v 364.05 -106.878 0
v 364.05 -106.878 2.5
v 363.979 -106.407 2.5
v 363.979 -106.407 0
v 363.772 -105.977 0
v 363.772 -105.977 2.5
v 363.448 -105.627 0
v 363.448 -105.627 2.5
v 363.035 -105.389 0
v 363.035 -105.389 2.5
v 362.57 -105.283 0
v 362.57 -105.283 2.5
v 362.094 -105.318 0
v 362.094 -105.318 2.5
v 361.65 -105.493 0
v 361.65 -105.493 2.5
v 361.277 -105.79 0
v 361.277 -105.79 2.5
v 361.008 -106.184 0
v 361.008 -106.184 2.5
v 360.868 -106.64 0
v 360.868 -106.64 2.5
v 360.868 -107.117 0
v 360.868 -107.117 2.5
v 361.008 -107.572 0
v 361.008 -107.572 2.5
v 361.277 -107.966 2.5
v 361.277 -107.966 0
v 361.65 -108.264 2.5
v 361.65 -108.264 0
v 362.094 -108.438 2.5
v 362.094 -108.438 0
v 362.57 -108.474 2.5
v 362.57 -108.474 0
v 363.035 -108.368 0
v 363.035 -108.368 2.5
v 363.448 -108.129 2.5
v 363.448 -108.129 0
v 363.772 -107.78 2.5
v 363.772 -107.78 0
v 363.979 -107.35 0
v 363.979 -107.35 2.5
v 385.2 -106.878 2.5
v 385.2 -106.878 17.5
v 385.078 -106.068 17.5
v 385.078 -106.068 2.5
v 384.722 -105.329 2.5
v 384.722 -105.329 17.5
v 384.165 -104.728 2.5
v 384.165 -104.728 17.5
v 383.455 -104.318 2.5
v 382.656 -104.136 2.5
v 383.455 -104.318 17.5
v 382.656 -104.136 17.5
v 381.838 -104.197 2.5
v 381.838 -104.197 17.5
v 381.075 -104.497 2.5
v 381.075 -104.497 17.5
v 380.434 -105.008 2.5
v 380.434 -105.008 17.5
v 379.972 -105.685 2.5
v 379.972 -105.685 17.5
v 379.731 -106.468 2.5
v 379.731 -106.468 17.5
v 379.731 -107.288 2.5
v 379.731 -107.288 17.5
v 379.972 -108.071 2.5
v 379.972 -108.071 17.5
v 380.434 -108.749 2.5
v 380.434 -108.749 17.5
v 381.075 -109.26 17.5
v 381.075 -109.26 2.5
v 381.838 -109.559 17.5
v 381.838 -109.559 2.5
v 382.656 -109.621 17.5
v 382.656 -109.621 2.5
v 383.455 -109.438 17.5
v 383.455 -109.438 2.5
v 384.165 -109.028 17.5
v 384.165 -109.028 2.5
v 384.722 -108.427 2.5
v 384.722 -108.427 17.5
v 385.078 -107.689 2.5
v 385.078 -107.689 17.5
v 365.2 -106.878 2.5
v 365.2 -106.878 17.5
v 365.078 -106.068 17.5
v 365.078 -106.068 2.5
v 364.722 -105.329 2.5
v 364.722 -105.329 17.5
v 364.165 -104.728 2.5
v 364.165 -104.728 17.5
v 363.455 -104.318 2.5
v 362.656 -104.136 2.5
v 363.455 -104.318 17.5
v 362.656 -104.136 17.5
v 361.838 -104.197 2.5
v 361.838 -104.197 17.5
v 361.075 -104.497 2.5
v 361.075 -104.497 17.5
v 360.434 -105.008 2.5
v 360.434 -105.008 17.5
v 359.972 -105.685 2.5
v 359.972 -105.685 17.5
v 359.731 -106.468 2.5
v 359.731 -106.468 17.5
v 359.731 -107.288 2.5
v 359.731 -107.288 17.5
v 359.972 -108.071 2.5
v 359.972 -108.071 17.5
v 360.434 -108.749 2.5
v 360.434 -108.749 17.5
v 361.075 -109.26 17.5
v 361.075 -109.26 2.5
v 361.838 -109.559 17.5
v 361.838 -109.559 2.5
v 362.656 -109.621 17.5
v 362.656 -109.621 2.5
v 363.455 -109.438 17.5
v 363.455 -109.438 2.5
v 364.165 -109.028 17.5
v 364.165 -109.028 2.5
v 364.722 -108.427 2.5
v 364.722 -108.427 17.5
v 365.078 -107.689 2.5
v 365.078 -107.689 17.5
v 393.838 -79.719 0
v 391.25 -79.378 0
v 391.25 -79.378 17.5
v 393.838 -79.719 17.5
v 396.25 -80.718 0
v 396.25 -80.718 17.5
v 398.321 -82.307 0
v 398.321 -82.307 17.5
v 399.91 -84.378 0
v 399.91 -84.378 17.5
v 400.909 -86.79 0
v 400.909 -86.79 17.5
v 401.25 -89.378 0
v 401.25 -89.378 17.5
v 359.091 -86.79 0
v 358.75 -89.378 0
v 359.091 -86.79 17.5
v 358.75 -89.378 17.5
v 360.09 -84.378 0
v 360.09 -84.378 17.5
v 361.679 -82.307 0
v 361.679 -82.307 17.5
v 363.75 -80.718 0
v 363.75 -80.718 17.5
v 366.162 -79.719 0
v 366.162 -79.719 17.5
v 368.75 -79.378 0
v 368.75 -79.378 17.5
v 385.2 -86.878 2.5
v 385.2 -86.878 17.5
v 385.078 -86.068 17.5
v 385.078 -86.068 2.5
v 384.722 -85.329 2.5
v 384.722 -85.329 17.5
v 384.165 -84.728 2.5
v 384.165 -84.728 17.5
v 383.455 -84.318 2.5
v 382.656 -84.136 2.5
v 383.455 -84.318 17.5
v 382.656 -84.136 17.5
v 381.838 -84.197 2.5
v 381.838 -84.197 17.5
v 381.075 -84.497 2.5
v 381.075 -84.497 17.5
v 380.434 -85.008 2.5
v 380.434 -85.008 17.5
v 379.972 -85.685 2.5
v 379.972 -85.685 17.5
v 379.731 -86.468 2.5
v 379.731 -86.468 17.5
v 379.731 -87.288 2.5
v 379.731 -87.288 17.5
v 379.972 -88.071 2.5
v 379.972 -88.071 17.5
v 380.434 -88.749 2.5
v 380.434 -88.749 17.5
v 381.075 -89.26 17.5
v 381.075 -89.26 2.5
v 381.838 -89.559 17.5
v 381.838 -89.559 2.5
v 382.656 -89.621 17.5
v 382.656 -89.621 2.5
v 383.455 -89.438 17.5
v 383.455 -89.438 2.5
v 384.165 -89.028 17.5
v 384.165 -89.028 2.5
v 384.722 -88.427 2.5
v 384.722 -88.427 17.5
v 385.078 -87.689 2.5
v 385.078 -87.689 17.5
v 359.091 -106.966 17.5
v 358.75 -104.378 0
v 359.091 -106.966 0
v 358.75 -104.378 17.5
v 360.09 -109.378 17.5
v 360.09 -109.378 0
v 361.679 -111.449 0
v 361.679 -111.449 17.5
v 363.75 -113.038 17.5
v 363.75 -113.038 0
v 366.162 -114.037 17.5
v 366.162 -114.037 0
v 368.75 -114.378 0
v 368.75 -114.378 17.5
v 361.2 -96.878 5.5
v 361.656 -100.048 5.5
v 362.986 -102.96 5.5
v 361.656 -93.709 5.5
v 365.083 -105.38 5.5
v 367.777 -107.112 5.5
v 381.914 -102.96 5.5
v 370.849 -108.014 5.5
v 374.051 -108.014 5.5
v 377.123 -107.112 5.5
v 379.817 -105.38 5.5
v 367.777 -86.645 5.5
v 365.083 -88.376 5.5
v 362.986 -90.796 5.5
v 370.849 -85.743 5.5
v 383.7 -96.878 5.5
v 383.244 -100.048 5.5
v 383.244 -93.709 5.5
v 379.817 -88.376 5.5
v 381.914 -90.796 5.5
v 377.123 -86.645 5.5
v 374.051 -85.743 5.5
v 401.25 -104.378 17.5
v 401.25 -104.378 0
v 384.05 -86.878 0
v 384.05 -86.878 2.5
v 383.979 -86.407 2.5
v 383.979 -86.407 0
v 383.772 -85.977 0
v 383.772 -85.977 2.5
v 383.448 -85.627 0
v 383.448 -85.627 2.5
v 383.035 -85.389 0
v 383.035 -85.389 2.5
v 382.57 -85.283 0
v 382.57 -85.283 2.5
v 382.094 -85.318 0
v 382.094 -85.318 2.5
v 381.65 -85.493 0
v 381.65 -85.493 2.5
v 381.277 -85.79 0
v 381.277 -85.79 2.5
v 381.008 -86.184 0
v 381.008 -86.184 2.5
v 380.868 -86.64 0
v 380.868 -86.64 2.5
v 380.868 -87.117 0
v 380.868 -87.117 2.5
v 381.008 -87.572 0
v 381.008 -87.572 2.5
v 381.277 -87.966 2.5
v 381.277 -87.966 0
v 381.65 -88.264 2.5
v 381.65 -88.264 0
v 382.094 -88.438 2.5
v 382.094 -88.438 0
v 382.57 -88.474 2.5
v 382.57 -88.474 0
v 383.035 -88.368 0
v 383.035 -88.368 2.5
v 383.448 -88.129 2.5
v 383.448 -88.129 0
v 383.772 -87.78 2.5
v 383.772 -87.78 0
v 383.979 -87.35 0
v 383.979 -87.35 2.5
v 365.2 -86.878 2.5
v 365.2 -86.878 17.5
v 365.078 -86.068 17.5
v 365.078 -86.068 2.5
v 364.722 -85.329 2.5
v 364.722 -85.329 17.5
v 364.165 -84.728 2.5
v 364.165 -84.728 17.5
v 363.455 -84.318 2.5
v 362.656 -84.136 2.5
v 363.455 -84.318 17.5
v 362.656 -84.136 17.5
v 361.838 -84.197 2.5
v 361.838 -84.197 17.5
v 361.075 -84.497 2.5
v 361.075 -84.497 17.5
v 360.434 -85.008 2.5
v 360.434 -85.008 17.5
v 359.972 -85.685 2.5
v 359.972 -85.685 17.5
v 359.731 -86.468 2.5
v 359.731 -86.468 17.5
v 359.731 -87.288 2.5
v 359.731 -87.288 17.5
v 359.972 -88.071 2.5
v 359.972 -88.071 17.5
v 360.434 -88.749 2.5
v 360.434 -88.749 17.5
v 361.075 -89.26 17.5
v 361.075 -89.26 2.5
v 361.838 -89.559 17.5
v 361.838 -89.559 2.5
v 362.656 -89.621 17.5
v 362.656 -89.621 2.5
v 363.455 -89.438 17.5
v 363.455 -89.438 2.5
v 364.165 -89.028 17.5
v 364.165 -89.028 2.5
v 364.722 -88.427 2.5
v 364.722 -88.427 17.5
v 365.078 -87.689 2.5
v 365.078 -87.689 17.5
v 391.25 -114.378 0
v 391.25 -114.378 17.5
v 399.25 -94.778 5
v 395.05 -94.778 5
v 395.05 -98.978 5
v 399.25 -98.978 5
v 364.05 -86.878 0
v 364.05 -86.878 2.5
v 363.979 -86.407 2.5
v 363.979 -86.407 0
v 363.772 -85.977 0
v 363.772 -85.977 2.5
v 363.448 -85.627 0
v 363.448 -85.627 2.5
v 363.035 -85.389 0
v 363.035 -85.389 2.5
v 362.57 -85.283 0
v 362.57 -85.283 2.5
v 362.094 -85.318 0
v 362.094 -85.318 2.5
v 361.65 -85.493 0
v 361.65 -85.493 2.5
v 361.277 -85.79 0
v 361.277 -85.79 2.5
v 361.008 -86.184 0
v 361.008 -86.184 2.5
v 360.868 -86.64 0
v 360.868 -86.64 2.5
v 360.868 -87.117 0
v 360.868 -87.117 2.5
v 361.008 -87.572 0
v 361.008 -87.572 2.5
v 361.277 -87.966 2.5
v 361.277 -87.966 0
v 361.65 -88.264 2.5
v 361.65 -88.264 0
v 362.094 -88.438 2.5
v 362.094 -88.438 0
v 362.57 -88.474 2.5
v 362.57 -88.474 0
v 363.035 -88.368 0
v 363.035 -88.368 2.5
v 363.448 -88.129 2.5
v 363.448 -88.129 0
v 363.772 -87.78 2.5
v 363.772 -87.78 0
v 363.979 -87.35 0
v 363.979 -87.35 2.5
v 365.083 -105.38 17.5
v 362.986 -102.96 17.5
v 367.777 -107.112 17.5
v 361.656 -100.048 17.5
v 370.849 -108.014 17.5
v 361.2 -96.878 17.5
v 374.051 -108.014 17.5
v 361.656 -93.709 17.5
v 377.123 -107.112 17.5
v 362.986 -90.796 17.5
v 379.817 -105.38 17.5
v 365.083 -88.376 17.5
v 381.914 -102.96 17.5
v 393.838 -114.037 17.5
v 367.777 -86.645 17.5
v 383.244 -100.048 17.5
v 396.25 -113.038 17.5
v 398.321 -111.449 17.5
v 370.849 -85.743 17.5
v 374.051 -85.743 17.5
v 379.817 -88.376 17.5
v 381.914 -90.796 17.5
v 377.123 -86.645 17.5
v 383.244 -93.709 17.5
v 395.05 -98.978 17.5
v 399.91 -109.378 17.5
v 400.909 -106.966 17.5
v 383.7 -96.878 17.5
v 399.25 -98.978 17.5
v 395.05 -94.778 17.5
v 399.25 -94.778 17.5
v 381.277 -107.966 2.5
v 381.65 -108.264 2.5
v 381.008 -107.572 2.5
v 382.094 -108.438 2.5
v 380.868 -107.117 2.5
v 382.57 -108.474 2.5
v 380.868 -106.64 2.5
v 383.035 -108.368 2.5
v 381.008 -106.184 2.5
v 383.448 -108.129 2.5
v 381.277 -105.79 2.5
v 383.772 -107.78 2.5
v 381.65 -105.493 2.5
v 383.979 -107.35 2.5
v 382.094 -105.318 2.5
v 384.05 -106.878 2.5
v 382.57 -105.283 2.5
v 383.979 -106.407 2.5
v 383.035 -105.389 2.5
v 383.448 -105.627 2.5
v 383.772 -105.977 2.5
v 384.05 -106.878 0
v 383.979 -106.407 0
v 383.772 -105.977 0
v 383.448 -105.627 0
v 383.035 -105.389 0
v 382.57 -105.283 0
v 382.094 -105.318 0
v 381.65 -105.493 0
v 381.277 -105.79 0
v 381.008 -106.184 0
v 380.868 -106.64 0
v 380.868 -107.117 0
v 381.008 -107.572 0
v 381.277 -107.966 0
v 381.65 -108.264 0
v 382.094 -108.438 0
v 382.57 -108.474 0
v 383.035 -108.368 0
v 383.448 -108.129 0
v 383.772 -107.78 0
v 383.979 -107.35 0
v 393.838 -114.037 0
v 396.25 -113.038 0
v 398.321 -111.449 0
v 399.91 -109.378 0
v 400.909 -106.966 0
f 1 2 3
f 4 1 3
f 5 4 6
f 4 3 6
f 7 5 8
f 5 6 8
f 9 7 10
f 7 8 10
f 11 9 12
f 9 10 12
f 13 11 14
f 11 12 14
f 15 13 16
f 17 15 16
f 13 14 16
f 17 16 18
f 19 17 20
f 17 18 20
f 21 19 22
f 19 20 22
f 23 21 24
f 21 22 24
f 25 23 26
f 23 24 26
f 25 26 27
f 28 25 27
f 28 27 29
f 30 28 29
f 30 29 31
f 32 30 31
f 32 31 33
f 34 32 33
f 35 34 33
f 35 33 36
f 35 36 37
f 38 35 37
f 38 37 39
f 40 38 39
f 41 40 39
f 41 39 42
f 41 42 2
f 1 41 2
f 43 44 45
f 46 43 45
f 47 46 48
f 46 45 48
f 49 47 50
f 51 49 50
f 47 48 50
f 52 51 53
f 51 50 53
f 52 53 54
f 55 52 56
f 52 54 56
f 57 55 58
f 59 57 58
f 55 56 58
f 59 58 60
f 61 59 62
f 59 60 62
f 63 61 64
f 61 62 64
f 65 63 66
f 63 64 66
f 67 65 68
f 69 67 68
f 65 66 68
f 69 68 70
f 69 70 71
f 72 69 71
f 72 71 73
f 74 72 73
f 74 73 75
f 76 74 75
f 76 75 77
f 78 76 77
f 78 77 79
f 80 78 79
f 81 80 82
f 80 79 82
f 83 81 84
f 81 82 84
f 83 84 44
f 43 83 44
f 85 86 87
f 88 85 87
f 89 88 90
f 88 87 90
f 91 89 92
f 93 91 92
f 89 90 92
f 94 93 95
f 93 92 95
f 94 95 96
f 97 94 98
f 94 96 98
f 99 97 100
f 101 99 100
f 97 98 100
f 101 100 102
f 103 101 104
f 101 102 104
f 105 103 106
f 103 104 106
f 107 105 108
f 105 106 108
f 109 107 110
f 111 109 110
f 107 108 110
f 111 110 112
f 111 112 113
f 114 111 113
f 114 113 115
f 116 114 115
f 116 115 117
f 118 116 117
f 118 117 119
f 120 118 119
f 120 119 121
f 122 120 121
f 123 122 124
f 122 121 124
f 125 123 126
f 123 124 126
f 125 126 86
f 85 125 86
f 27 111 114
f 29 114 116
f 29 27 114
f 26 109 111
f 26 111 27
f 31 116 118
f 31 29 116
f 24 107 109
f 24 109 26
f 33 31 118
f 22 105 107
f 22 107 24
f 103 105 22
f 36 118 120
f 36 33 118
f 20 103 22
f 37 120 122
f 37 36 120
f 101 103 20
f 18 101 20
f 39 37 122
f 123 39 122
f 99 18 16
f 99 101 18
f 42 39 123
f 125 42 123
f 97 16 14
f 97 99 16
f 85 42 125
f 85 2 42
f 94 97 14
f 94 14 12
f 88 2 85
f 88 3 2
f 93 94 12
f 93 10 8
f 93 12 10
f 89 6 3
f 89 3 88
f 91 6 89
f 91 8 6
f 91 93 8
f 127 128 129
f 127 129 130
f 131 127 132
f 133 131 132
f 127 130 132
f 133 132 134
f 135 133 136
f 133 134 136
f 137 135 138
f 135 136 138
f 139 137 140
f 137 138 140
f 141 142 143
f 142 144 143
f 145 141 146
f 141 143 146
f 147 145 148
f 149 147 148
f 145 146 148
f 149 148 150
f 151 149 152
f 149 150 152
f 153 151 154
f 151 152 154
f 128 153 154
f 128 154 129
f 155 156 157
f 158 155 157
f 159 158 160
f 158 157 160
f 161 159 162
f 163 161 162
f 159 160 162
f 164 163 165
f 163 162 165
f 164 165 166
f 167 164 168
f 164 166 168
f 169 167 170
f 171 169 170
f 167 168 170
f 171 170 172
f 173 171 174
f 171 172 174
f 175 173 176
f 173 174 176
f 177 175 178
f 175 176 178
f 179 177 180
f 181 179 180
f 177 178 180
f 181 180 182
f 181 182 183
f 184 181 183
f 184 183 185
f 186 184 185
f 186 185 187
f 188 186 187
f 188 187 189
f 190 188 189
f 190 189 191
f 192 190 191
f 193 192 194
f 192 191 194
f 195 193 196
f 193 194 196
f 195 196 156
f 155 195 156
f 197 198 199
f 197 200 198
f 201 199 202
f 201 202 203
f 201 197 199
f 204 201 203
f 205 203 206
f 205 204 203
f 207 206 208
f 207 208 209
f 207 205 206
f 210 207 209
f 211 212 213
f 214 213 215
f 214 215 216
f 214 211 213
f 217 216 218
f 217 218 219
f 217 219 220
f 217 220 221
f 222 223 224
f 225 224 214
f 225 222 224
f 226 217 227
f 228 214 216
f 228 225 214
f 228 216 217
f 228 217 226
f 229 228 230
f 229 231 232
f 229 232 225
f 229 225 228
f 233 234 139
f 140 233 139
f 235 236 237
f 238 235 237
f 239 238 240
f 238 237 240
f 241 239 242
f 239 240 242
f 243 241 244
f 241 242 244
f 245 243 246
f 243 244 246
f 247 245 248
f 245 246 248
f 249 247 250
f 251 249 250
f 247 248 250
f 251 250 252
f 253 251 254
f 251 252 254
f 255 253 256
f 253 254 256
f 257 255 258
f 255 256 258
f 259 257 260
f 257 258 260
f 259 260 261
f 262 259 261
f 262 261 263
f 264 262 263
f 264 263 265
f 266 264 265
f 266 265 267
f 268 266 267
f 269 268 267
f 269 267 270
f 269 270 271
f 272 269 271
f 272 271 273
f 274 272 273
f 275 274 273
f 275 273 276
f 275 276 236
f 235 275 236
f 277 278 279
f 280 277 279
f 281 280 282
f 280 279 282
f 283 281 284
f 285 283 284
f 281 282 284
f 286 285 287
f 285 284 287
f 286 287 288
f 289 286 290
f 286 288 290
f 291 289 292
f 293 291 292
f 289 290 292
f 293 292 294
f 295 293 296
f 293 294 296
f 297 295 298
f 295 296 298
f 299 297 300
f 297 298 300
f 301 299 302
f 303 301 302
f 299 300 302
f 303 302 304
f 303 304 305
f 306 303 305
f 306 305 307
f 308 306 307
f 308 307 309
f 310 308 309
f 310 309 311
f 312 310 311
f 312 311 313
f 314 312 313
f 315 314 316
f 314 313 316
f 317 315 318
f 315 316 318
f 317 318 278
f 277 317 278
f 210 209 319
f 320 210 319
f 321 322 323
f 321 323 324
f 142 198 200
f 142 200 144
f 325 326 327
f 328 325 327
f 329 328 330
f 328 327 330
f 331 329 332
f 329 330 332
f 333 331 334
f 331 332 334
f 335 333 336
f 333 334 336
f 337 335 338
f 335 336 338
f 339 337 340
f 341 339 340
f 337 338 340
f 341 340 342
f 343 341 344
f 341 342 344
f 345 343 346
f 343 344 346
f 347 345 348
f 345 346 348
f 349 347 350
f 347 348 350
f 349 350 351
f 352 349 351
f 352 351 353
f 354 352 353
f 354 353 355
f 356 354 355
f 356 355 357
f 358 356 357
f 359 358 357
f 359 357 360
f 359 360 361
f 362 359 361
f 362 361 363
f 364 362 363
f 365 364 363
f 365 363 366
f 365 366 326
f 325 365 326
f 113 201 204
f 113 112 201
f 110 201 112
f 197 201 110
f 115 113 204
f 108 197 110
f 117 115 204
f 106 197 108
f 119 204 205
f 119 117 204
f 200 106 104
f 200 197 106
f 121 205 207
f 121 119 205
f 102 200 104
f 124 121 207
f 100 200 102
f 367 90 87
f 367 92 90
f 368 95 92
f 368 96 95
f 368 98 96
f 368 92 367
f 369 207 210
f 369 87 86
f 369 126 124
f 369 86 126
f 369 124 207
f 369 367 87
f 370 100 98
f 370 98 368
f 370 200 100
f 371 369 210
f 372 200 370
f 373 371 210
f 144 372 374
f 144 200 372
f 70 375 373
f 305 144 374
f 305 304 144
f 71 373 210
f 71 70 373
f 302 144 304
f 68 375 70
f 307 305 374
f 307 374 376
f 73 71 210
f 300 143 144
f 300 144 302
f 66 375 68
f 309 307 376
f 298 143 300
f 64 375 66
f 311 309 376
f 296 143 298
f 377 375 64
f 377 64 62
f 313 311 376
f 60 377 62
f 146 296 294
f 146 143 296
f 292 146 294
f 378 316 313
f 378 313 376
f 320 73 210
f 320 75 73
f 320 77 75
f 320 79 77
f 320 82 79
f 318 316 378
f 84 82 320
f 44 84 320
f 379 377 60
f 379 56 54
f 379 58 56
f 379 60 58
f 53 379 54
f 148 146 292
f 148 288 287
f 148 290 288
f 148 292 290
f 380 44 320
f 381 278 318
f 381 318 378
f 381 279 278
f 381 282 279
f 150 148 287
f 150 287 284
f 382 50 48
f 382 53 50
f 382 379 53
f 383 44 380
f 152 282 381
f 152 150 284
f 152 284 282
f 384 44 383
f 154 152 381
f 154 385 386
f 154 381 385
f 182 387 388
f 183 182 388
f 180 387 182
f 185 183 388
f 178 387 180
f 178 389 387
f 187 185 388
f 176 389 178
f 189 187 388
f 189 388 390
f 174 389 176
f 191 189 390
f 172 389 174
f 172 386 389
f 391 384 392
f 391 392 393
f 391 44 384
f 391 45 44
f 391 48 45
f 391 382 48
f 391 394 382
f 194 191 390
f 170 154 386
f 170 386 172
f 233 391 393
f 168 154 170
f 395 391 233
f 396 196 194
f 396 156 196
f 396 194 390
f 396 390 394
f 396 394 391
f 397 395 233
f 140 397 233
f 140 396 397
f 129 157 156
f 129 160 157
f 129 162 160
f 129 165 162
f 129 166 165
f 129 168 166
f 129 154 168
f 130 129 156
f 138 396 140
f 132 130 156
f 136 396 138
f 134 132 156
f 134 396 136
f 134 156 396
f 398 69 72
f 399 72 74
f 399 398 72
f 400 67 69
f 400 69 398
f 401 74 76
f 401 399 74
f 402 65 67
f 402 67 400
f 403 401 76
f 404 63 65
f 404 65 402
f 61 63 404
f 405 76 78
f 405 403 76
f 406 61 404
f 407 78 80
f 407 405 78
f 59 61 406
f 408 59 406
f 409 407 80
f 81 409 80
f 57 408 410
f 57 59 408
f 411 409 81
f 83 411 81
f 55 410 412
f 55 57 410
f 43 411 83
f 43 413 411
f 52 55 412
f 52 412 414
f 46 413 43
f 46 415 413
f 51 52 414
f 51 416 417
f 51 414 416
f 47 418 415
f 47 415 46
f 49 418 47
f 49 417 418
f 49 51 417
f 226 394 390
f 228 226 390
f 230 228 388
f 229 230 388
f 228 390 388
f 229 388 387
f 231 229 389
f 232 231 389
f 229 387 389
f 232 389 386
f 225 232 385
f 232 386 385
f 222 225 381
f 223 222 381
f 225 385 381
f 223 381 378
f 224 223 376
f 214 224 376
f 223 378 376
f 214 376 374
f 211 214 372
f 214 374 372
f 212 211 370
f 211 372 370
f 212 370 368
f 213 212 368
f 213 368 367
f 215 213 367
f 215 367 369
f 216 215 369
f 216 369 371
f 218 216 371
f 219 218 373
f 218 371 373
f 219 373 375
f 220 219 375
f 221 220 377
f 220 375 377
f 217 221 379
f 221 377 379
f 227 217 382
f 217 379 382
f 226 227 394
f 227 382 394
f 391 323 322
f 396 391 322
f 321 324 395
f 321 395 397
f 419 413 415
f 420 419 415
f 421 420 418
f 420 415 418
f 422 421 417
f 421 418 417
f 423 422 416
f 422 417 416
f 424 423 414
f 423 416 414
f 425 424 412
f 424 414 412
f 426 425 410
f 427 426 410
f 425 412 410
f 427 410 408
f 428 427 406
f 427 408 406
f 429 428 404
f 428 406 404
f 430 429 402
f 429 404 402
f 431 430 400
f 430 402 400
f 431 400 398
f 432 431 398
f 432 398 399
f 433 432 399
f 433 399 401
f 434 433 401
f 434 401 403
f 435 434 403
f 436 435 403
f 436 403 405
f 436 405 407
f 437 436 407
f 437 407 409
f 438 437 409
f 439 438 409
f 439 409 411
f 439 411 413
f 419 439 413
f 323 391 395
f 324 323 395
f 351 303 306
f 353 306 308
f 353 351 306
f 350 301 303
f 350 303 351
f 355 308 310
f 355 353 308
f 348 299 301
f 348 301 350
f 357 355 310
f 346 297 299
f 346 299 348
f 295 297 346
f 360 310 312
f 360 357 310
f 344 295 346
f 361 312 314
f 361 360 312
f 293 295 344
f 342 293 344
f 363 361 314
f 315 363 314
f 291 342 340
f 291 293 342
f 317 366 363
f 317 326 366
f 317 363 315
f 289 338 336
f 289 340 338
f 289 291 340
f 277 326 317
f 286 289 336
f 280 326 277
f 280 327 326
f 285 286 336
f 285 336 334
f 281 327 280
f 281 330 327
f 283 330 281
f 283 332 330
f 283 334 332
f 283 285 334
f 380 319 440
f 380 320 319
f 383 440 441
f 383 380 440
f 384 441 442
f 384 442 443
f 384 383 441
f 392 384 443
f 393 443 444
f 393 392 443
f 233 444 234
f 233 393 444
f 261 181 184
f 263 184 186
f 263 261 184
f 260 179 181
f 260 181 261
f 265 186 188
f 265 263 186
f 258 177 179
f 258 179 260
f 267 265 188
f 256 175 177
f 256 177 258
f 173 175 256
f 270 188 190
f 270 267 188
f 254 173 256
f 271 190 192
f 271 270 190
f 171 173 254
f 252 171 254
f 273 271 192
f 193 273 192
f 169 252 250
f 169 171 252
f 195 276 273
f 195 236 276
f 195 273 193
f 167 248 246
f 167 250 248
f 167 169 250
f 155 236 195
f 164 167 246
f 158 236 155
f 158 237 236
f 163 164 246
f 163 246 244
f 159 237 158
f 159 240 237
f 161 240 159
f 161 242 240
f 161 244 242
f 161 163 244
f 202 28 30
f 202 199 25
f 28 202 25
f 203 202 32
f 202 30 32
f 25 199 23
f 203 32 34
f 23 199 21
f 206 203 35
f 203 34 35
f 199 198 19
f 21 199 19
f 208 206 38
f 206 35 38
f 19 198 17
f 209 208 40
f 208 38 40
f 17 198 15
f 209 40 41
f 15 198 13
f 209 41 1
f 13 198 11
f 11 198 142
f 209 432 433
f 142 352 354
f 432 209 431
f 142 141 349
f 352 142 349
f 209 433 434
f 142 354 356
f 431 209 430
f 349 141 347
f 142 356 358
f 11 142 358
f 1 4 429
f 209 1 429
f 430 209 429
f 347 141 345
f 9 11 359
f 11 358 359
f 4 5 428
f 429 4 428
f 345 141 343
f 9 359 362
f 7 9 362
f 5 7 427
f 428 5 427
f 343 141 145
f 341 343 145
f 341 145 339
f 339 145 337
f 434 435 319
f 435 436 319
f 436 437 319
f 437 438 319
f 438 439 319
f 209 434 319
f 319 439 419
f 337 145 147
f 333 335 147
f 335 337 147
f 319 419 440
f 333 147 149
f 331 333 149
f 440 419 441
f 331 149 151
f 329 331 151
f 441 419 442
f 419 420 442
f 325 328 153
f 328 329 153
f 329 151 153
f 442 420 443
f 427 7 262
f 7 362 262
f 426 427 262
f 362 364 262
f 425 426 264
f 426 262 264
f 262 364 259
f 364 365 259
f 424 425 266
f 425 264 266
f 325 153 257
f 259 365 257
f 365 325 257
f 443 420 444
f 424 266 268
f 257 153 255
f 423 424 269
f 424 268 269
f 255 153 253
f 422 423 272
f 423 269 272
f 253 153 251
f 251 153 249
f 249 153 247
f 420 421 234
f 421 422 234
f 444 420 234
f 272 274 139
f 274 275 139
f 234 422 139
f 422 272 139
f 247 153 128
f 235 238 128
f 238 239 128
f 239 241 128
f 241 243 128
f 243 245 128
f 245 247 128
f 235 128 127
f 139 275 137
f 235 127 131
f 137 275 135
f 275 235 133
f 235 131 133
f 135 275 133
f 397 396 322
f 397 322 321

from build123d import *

# Parameters (mm, degrees)
SKETCH1_W           = 42.5
SKETCH1_H           = 35
BOSS_EXTRUDE1_DEPTH = 17.5
SKETCH3_W           = 4.2
SKETCH3_H           = 4.2
CUT_EXTRUDE1_DEPTH  = 12.5
SKETCH4_R           = 1.599999998
SKETCH4_R_2         = 1.6
CUT_EXTRUDE2_DEPTH  = 18.5
SKETCH5_R           = 2.75
CUT_EXTRUDE3_DEPTH  = 15
SKETCH6_R           = 11.25
CUT_EXTRUDE4_DEPTH  = 12
FILLET1_R           = 10


with BuildPart() as part:
    # Sketch1 → Boss-Extrude1 (new body)
    with BuildSketch(Plane.XY):
        with Locations((380.000010525, -96.878222963)):
            Rectangle(SKETCH1_W, SKETCH1_H)
    extrude(amount=BOSS_EXTRUDE1_DEPTH)

    # Sketch3 → Cut-Extrude1 (cut)
    with BuildSketch(Plane.XY.offset(17.5)):
        with Locations((397.150010525, -96.878222963)):
            Rectangle(SKETCH3_W, SKETCH3_H)
    extrude(amount=-CUT_EXTRUDE1_DEPTH, mode=Mode.SUBTRACT)

    # Sketch4 → Cut-Extrude2 (cut, through all)
    with BuildSketch(Plane.XY.offset(17.5)):
        with Locations((382.450010525, -86.878222963)):
            Circle(SKETCH4_R)
        with Locations((382.450010525, -106.878222963)):
            Circle(SKETCH4_R_2)
        with Locations((362.450010525, -86.878222963)):
            Circle(SKETCH4_R)
        with Locations((362.450010525, -106.878222963)):
            Circle(SKETCH4_R_2)
    extrude(amount=-CUT_EXTRUDE2_DEPTH, mode=Mode.SUBTRACT)

    # Sketch5 → Cut-Extrude3 (cut)
    with BuildSketch(Plane.XY.offset(17.5)):
        with Locations((382.450010525, -106.878222963)):
            Circle(SKETCH5_R)
        with Locations((382.450010525, -86.878222963)):
            Circle(SKETCH5_R)
        with Locations((362.450010525, -86.878222963)):
            Circle(SKETCH5_R)
        with Locations((362.450010525, -106.878222963)):
            Circle(SKETCH5_R)
    extrude(amount=-CUT_EXTRUDE3_DEPTH, mode=Mode.SUBTRACT)

    # Sketch6 → Cut-Extrude4 (cut)
    with BuildSketch(Plane.XY.offset(17.5)):
        with Locations((372.450010525, -96.878222963)):
            Circle(SKETCH6_R)
    extrude(amount=-CUT_EXTRUDE4_DEPTH, mode=Mode.SUBTRACT)

    # Fillet1
    fillet1_edges = [part.edges().sort_by_distance(p)[0] for p in [
        (401.250010525, -114.378222963, 8.75),
        (358.750010525, -114.378222963, 8.75),
        (358.750010525, -79.378222963, 8.75),
        (401.250010525, -79.378222963, 8.75),
    ]]
    fillet(fillet1_edges, radius=FILLET1_R)


solid = part.part
